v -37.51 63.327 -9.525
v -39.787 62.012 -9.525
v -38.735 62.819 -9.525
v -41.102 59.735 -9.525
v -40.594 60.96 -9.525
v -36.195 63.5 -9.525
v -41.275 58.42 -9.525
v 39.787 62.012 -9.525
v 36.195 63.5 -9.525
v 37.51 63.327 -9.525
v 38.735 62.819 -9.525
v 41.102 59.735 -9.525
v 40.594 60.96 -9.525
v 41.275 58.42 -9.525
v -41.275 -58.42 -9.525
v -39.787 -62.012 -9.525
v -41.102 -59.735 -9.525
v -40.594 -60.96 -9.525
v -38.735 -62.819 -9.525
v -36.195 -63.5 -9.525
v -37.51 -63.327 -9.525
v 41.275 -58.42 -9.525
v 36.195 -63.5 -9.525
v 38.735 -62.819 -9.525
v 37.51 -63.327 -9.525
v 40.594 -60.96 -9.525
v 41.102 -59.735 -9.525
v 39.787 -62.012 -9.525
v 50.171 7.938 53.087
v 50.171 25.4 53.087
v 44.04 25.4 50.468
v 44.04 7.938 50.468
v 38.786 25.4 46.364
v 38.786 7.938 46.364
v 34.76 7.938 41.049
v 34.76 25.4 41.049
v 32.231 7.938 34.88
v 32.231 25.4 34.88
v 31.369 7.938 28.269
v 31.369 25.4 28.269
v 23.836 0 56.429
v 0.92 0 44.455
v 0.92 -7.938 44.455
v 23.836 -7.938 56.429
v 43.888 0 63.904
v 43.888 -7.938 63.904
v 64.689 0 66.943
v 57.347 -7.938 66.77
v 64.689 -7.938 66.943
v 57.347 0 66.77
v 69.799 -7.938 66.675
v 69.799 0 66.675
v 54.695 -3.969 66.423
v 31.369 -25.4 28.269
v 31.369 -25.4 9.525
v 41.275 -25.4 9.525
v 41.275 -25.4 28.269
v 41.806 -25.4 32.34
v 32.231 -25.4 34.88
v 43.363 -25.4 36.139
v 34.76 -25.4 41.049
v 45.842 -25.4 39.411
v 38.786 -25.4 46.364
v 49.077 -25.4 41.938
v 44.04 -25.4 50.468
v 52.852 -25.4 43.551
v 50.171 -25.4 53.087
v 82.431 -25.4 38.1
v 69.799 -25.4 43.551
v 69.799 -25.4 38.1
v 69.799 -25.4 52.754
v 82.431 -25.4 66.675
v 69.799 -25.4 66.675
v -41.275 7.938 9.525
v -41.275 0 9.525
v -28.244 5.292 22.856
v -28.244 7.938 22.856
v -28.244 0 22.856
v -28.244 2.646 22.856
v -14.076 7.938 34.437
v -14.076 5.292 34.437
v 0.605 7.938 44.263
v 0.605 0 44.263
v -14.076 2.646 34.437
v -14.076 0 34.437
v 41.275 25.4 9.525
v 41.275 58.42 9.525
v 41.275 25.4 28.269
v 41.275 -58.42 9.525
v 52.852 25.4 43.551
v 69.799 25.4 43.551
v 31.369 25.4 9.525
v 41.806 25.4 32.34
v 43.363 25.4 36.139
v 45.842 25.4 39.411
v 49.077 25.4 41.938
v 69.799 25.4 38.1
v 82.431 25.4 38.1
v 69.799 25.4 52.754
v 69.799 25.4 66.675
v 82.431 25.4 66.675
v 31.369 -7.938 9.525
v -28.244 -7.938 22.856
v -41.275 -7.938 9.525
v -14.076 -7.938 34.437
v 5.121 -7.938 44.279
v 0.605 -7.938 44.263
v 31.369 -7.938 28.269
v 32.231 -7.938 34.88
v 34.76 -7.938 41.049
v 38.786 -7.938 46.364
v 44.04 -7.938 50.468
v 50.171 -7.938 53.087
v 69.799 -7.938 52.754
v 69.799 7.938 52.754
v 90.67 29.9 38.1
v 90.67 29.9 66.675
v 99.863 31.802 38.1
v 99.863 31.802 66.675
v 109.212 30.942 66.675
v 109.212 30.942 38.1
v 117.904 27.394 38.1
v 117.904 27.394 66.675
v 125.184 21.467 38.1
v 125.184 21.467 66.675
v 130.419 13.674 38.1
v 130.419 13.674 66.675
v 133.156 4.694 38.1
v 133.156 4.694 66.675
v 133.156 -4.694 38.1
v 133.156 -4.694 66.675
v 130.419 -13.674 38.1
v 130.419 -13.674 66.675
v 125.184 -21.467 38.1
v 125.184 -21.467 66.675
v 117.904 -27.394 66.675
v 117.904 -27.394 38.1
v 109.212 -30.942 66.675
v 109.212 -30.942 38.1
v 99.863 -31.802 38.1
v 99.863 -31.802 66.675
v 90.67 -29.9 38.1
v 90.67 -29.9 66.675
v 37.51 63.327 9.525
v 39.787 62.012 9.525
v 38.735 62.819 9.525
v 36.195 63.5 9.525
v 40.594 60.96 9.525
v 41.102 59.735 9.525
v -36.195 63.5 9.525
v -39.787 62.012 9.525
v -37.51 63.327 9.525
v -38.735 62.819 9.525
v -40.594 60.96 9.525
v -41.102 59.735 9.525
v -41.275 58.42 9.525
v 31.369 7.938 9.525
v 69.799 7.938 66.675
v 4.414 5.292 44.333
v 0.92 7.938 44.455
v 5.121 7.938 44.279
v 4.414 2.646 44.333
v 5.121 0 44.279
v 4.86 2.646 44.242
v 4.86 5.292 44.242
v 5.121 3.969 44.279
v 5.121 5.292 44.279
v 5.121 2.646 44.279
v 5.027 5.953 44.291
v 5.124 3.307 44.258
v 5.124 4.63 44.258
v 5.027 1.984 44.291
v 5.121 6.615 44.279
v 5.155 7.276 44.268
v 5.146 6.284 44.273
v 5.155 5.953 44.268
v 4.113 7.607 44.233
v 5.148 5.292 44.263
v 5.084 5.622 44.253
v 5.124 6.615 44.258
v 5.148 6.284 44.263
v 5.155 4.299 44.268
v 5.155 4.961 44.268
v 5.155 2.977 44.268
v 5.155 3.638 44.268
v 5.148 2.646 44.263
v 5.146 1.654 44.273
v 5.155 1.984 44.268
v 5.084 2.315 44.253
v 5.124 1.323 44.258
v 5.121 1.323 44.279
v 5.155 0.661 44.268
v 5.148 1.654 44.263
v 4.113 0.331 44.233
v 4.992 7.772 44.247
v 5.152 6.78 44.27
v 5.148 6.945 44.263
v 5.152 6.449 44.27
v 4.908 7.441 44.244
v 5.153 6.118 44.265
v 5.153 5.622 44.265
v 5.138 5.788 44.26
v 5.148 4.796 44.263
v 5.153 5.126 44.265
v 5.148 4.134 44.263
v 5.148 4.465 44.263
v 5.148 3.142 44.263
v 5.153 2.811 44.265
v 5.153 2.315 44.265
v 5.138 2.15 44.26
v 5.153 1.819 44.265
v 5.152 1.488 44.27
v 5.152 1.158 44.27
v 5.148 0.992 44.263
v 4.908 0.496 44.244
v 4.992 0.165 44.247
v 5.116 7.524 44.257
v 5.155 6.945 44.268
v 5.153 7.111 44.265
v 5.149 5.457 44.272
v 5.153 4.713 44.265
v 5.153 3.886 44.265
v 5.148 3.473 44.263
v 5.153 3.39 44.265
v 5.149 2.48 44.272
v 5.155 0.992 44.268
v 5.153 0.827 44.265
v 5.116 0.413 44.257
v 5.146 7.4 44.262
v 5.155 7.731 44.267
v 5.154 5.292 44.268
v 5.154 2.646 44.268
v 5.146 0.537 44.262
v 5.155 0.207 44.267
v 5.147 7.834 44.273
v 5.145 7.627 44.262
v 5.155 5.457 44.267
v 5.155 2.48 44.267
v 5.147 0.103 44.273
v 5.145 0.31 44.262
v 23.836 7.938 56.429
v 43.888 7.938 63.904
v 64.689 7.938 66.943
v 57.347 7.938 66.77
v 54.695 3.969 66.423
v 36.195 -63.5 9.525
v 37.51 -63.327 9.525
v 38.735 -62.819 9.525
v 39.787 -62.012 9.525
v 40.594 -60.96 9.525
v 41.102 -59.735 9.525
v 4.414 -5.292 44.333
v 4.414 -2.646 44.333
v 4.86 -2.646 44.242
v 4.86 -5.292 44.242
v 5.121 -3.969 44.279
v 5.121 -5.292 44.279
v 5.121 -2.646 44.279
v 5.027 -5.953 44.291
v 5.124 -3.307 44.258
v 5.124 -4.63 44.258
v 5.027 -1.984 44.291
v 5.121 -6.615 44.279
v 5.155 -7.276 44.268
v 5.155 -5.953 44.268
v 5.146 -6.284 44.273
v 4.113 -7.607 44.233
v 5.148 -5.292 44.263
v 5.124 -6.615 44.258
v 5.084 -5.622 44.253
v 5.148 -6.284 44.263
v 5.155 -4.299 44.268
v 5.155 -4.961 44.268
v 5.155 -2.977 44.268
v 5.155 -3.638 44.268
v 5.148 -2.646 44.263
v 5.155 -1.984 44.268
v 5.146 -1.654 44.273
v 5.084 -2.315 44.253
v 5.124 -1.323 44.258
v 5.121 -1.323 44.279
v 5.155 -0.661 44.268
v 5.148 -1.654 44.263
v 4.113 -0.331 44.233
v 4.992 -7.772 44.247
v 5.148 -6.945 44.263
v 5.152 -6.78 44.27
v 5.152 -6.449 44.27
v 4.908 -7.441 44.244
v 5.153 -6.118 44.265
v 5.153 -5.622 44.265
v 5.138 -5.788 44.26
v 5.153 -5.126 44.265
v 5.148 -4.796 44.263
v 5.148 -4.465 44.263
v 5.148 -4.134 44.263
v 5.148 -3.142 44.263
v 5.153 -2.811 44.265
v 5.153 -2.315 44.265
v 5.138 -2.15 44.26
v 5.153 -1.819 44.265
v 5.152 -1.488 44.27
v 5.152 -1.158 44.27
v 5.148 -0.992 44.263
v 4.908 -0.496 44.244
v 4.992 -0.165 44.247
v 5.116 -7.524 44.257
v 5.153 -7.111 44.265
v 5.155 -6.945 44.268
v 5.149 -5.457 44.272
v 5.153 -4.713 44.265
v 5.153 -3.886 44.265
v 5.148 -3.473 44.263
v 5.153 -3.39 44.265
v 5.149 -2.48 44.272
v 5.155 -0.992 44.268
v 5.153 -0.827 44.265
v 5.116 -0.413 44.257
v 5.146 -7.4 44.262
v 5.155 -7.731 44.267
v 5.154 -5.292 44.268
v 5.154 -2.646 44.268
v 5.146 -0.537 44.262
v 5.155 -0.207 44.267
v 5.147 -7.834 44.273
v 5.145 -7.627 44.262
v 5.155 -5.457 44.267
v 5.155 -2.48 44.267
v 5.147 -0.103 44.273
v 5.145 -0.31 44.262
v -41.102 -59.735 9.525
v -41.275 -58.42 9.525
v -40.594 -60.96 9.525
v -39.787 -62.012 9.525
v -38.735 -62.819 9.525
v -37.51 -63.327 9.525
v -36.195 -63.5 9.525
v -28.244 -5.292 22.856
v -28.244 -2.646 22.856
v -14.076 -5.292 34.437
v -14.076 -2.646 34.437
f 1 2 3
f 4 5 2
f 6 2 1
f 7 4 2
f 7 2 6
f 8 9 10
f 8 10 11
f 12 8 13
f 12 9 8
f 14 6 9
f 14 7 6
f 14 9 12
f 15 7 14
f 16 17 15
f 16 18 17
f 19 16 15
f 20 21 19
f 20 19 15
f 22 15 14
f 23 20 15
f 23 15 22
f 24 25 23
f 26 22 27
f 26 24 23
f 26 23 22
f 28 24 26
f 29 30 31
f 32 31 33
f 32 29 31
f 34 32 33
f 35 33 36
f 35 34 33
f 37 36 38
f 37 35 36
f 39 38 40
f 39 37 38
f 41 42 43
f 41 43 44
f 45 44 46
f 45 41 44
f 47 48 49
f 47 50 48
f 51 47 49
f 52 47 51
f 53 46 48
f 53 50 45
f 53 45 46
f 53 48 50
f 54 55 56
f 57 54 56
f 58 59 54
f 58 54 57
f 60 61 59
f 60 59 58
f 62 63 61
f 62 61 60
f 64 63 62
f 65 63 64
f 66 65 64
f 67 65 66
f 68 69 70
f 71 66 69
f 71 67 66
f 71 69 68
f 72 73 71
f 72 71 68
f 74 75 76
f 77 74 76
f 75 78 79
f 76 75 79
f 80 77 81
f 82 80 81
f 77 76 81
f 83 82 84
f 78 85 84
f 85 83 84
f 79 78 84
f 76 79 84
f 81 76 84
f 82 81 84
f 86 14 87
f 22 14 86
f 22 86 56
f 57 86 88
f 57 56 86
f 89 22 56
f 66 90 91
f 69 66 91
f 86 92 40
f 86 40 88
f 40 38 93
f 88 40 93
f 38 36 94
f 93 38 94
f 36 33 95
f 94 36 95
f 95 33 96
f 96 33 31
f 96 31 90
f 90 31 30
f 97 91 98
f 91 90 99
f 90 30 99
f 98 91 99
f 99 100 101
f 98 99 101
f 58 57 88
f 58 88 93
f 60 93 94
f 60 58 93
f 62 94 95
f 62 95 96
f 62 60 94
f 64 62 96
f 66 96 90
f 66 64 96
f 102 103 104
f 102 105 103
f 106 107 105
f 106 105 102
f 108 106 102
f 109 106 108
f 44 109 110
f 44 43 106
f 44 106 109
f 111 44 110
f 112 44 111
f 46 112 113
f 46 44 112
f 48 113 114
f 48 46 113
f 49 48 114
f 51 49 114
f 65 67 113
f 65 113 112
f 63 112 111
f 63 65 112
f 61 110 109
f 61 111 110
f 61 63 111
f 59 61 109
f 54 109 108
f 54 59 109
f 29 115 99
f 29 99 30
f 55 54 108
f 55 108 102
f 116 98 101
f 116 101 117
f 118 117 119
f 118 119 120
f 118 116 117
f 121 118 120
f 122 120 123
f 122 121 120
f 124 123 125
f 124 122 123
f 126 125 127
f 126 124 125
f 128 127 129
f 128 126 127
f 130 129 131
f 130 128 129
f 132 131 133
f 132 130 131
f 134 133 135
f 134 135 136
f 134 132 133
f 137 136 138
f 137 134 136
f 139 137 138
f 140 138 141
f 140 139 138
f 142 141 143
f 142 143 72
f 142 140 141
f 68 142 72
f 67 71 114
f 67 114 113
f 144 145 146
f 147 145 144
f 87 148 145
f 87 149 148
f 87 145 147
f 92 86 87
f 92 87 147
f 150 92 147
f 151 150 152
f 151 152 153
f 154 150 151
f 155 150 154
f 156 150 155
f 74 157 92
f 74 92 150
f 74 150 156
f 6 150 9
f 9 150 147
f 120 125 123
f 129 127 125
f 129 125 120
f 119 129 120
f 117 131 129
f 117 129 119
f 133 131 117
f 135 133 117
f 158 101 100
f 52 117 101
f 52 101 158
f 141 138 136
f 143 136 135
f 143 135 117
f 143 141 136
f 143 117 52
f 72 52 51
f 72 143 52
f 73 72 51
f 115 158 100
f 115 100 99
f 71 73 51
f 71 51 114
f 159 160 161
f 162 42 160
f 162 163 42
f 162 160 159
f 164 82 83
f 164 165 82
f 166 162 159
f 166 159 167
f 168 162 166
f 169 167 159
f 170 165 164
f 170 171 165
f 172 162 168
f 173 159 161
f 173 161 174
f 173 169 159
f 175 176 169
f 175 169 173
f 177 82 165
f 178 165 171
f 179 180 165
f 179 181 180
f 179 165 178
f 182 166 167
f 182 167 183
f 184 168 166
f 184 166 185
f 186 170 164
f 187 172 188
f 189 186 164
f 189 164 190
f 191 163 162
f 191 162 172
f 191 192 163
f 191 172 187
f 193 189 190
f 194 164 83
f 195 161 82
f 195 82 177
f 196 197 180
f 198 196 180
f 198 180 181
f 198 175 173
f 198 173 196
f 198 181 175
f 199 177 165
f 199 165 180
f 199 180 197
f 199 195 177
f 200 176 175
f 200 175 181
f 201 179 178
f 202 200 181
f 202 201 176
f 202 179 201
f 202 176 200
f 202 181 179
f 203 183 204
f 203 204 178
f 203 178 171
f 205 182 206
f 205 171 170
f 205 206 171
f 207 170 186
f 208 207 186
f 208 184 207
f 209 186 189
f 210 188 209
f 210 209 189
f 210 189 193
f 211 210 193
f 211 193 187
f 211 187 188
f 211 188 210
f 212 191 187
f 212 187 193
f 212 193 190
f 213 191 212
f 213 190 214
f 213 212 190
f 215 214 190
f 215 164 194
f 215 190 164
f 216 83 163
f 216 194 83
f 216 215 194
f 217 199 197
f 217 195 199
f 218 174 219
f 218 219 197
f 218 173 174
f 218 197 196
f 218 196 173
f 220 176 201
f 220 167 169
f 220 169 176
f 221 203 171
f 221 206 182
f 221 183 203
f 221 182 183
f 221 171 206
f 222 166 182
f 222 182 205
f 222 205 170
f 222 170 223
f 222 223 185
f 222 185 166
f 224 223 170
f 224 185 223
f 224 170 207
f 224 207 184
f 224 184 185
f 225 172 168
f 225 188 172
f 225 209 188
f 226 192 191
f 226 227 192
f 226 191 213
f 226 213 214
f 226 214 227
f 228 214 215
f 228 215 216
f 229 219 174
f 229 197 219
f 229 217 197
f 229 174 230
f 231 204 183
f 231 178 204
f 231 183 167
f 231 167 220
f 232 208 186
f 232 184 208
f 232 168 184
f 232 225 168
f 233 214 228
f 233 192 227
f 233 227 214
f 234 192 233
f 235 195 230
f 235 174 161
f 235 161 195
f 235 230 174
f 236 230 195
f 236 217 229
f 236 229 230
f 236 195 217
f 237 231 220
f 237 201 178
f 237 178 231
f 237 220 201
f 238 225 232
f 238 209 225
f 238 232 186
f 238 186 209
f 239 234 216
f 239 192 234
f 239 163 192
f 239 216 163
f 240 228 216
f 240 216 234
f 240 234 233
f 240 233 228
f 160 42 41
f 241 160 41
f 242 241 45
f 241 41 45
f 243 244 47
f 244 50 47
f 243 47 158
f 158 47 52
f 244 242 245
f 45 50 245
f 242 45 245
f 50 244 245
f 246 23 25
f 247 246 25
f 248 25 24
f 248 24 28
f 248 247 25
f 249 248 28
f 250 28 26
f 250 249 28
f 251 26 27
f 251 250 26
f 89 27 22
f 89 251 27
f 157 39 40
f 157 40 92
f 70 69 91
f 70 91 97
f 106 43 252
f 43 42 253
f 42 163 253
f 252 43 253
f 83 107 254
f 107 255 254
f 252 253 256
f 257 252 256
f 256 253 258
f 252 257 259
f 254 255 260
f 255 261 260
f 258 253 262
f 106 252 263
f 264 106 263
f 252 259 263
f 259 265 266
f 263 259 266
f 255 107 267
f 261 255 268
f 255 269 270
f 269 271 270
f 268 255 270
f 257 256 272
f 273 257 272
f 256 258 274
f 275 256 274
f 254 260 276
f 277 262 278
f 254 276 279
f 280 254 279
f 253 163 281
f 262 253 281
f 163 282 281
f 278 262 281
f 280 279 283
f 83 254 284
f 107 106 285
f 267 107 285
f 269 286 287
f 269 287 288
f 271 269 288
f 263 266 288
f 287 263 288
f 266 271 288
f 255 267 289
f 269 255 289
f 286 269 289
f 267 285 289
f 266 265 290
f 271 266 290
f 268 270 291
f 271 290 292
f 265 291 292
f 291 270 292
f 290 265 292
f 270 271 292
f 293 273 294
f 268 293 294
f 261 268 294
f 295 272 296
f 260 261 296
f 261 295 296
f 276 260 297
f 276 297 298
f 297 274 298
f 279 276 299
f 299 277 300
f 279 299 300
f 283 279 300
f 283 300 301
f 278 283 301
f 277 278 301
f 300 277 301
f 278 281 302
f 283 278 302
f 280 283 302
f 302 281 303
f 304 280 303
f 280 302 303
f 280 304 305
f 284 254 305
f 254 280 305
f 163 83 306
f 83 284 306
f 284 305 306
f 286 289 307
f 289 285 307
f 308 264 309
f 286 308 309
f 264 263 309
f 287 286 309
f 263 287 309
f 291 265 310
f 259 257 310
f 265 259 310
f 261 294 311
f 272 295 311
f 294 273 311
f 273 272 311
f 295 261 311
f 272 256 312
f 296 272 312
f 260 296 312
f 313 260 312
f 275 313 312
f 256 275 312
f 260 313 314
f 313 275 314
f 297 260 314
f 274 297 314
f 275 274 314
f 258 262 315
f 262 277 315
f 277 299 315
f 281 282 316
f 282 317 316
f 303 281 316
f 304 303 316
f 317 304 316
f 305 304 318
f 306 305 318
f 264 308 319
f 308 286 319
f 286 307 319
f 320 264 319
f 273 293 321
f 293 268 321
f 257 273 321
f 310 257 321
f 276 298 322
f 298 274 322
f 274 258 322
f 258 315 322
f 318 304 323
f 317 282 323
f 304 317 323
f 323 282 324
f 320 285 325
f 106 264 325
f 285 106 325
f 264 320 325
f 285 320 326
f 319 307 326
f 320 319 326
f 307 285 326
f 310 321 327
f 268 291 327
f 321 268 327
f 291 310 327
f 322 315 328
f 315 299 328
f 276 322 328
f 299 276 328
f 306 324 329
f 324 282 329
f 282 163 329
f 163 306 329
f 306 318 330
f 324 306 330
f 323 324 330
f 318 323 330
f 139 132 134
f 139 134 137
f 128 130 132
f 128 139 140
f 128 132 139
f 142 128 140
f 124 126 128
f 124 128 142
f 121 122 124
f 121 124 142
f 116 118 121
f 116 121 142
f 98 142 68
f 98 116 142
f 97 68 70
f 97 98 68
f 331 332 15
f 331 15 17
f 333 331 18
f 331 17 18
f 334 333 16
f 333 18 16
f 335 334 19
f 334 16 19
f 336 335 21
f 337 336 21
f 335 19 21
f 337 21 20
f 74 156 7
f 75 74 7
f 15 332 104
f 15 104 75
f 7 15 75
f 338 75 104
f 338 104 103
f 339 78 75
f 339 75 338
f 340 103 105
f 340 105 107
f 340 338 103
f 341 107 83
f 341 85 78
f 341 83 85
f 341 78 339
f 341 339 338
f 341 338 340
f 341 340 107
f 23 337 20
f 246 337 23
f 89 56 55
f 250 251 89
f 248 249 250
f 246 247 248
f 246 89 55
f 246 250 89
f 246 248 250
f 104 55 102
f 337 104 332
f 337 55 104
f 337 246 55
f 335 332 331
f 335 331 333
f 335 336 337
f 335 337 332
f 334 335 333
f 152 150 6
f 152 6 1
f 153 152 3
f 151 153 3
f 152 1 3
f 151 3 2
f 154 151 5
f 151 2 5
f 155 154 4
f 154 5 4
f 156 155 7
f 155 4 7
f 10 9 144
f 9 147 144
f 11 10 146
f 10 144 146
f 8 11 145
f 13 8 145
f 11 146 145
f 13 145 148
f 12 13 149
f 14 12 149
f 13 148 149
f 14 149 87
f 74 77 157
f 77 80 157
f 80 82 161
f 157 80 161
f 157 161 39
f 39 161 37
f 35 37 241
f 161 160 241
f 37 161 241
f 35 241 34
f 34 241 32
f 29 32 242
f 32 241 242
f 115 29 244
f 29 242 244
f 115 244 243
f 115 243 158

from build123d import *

# Parameters (mm, degrees)
F1_DEPTH = 63.5
F2_DEPTH = 25.4
F3_DEPTH = 7.9375
F5_R     = 5.08


with BuildPart() as f1:
    # F0 (on Front) → F1 (new body, symmetric)
    with BuildSketch(Plane.XZ):
        Polygon((41.275, -9.525), (41.275, 9.525), (31.3690012749, 9.525), (-41.275, 9.525), (-41.275, -9.525), align=None)
    extrude(amount=F1_DEPTH, both=True)

    # F0 (on Front) → F2 (join, symmetric)
    with BuildSketch(Plane.XZ):
        with BuildLine():
            Line((31.3690012749, 9.525), (41.275, 9.525))
            Line((41.275, 9.525), (41.275, 28.2690877087))
            ThreePointArc((41.275, 28.2690877087), (44.4961665848, 37.8553343621), (52.8524645544, 43.5513262258))
            Line((52.8524645544, 43.5513262258), (69.7987371812, 43.5513262258))
            Line((69.7987371812, 43.5513262258), (69.7987371812, 52.7542612036))
            Line((69.7987371812, 52.7542612036), (50.1708027815, 53.0874418332))
            ThreePointArc((50.1708027815, 53.0874418332), (36.6001755499, 43.837151504), (31.3690012749, 28.2690877087))
            Line((31.3690012749, 28.2690877087), (31.3690012749, 9.525))
        make_face()
        Polygon((69.7987371812, 52.7542612036), (69.7987371812, 43.5513262258), (69.7987371812, 38.1), (101.6512628188, 38.1), (101.6512628188, 66.675), (69.7987371812, 66.675), align=None)
    extrude(amount=F2_DEPTH, both=True)

    # F0 (on Front) → F3 (join, symmetric)
    with BuildSketch(Plane.XZ):
        with BuildLine():
            Line((-41.275, 9.525), (31.3690012749, 9.525))
            Line((31.3690012749, 9.525), (31.3690012749, 28.2690877087))
            ThreePointArc((31.3690012749, 28.2690877087), (36.6001755499, 43.837151504), (50.1708027815, 53.0874418332))
            Line((50.1708027815, 53.0874418332), (69.7987371812, 52.7542612036))
            Line((69.7987371812, 52.7542612036), (69.7987371812, 66.675))
            add(Edge.make_bspline(
                [(0.9200547216, 44.4546873168), (21.9732050528, 57.1926332926), (55.5999299853, 69.1414192126), (66.4309648739, 66.6444715672), (69.7987371812, 66.675)],
                knots=[0.3021299469, 0.3021299469, 0.3021299469, 0.3021299469, 0.7310163448, 1, 1, 1, 1], degree=3))
            add(Edge.make_bspline(
                [(0.9200547224, 44.4546873157), (5.3862455156, 44.3452942524), (7.7617773977, 44.1589559848), (0.6045961391, 44.2634363016)],
                knots=[6.1143383921, 6.1143383921, 6.1143383921, 6.1143383921, 12.0207626888, 12.0207626888, 12.0207626888, 12.0207626888], degree=3))
            add(Edge.make_bspline(
                [(-41.275, 9.525), (-29.0215326785, 23.7296115654), (-14.1237601662, 35.3160902289), (0.6045961391, 44.2634363016)],
                knots=[0, 0, 0, 0, 0.2999880046, 0.2999880046, 0.2999880046, 0.2999880046], degree=3))
        make_face()
    extrude(amount=F3_DEPTH, both=True)

    # F0 (on Front) → F4 (revolve)
    with BuildSketch(Plane.XZ):
        Polygon((69.7987371812, 52.7542612036), (69.7987371812, 43.5513262258), (69.7987371812, 38.1), (101.6512628188, 38.1), (101.6512628188, 66.675), (69.7987371812, 66.675), align=None)
    revolve(axis=Axis((101.6512628188, 0, 52.3875), (0, 0, -1)))

    # F5
    f5_edges = [f1.edges().sort_by_distance(p)[0] for p in [
        (-41.275, -63.5, 0),
        (41.275, -63.5, 0),
        (-41.275, 63.5, 0),
        (41.275, 63.5, 0),
    ]]
    fillet(f5_edges, radius=F5_R)


solid = f1.part
